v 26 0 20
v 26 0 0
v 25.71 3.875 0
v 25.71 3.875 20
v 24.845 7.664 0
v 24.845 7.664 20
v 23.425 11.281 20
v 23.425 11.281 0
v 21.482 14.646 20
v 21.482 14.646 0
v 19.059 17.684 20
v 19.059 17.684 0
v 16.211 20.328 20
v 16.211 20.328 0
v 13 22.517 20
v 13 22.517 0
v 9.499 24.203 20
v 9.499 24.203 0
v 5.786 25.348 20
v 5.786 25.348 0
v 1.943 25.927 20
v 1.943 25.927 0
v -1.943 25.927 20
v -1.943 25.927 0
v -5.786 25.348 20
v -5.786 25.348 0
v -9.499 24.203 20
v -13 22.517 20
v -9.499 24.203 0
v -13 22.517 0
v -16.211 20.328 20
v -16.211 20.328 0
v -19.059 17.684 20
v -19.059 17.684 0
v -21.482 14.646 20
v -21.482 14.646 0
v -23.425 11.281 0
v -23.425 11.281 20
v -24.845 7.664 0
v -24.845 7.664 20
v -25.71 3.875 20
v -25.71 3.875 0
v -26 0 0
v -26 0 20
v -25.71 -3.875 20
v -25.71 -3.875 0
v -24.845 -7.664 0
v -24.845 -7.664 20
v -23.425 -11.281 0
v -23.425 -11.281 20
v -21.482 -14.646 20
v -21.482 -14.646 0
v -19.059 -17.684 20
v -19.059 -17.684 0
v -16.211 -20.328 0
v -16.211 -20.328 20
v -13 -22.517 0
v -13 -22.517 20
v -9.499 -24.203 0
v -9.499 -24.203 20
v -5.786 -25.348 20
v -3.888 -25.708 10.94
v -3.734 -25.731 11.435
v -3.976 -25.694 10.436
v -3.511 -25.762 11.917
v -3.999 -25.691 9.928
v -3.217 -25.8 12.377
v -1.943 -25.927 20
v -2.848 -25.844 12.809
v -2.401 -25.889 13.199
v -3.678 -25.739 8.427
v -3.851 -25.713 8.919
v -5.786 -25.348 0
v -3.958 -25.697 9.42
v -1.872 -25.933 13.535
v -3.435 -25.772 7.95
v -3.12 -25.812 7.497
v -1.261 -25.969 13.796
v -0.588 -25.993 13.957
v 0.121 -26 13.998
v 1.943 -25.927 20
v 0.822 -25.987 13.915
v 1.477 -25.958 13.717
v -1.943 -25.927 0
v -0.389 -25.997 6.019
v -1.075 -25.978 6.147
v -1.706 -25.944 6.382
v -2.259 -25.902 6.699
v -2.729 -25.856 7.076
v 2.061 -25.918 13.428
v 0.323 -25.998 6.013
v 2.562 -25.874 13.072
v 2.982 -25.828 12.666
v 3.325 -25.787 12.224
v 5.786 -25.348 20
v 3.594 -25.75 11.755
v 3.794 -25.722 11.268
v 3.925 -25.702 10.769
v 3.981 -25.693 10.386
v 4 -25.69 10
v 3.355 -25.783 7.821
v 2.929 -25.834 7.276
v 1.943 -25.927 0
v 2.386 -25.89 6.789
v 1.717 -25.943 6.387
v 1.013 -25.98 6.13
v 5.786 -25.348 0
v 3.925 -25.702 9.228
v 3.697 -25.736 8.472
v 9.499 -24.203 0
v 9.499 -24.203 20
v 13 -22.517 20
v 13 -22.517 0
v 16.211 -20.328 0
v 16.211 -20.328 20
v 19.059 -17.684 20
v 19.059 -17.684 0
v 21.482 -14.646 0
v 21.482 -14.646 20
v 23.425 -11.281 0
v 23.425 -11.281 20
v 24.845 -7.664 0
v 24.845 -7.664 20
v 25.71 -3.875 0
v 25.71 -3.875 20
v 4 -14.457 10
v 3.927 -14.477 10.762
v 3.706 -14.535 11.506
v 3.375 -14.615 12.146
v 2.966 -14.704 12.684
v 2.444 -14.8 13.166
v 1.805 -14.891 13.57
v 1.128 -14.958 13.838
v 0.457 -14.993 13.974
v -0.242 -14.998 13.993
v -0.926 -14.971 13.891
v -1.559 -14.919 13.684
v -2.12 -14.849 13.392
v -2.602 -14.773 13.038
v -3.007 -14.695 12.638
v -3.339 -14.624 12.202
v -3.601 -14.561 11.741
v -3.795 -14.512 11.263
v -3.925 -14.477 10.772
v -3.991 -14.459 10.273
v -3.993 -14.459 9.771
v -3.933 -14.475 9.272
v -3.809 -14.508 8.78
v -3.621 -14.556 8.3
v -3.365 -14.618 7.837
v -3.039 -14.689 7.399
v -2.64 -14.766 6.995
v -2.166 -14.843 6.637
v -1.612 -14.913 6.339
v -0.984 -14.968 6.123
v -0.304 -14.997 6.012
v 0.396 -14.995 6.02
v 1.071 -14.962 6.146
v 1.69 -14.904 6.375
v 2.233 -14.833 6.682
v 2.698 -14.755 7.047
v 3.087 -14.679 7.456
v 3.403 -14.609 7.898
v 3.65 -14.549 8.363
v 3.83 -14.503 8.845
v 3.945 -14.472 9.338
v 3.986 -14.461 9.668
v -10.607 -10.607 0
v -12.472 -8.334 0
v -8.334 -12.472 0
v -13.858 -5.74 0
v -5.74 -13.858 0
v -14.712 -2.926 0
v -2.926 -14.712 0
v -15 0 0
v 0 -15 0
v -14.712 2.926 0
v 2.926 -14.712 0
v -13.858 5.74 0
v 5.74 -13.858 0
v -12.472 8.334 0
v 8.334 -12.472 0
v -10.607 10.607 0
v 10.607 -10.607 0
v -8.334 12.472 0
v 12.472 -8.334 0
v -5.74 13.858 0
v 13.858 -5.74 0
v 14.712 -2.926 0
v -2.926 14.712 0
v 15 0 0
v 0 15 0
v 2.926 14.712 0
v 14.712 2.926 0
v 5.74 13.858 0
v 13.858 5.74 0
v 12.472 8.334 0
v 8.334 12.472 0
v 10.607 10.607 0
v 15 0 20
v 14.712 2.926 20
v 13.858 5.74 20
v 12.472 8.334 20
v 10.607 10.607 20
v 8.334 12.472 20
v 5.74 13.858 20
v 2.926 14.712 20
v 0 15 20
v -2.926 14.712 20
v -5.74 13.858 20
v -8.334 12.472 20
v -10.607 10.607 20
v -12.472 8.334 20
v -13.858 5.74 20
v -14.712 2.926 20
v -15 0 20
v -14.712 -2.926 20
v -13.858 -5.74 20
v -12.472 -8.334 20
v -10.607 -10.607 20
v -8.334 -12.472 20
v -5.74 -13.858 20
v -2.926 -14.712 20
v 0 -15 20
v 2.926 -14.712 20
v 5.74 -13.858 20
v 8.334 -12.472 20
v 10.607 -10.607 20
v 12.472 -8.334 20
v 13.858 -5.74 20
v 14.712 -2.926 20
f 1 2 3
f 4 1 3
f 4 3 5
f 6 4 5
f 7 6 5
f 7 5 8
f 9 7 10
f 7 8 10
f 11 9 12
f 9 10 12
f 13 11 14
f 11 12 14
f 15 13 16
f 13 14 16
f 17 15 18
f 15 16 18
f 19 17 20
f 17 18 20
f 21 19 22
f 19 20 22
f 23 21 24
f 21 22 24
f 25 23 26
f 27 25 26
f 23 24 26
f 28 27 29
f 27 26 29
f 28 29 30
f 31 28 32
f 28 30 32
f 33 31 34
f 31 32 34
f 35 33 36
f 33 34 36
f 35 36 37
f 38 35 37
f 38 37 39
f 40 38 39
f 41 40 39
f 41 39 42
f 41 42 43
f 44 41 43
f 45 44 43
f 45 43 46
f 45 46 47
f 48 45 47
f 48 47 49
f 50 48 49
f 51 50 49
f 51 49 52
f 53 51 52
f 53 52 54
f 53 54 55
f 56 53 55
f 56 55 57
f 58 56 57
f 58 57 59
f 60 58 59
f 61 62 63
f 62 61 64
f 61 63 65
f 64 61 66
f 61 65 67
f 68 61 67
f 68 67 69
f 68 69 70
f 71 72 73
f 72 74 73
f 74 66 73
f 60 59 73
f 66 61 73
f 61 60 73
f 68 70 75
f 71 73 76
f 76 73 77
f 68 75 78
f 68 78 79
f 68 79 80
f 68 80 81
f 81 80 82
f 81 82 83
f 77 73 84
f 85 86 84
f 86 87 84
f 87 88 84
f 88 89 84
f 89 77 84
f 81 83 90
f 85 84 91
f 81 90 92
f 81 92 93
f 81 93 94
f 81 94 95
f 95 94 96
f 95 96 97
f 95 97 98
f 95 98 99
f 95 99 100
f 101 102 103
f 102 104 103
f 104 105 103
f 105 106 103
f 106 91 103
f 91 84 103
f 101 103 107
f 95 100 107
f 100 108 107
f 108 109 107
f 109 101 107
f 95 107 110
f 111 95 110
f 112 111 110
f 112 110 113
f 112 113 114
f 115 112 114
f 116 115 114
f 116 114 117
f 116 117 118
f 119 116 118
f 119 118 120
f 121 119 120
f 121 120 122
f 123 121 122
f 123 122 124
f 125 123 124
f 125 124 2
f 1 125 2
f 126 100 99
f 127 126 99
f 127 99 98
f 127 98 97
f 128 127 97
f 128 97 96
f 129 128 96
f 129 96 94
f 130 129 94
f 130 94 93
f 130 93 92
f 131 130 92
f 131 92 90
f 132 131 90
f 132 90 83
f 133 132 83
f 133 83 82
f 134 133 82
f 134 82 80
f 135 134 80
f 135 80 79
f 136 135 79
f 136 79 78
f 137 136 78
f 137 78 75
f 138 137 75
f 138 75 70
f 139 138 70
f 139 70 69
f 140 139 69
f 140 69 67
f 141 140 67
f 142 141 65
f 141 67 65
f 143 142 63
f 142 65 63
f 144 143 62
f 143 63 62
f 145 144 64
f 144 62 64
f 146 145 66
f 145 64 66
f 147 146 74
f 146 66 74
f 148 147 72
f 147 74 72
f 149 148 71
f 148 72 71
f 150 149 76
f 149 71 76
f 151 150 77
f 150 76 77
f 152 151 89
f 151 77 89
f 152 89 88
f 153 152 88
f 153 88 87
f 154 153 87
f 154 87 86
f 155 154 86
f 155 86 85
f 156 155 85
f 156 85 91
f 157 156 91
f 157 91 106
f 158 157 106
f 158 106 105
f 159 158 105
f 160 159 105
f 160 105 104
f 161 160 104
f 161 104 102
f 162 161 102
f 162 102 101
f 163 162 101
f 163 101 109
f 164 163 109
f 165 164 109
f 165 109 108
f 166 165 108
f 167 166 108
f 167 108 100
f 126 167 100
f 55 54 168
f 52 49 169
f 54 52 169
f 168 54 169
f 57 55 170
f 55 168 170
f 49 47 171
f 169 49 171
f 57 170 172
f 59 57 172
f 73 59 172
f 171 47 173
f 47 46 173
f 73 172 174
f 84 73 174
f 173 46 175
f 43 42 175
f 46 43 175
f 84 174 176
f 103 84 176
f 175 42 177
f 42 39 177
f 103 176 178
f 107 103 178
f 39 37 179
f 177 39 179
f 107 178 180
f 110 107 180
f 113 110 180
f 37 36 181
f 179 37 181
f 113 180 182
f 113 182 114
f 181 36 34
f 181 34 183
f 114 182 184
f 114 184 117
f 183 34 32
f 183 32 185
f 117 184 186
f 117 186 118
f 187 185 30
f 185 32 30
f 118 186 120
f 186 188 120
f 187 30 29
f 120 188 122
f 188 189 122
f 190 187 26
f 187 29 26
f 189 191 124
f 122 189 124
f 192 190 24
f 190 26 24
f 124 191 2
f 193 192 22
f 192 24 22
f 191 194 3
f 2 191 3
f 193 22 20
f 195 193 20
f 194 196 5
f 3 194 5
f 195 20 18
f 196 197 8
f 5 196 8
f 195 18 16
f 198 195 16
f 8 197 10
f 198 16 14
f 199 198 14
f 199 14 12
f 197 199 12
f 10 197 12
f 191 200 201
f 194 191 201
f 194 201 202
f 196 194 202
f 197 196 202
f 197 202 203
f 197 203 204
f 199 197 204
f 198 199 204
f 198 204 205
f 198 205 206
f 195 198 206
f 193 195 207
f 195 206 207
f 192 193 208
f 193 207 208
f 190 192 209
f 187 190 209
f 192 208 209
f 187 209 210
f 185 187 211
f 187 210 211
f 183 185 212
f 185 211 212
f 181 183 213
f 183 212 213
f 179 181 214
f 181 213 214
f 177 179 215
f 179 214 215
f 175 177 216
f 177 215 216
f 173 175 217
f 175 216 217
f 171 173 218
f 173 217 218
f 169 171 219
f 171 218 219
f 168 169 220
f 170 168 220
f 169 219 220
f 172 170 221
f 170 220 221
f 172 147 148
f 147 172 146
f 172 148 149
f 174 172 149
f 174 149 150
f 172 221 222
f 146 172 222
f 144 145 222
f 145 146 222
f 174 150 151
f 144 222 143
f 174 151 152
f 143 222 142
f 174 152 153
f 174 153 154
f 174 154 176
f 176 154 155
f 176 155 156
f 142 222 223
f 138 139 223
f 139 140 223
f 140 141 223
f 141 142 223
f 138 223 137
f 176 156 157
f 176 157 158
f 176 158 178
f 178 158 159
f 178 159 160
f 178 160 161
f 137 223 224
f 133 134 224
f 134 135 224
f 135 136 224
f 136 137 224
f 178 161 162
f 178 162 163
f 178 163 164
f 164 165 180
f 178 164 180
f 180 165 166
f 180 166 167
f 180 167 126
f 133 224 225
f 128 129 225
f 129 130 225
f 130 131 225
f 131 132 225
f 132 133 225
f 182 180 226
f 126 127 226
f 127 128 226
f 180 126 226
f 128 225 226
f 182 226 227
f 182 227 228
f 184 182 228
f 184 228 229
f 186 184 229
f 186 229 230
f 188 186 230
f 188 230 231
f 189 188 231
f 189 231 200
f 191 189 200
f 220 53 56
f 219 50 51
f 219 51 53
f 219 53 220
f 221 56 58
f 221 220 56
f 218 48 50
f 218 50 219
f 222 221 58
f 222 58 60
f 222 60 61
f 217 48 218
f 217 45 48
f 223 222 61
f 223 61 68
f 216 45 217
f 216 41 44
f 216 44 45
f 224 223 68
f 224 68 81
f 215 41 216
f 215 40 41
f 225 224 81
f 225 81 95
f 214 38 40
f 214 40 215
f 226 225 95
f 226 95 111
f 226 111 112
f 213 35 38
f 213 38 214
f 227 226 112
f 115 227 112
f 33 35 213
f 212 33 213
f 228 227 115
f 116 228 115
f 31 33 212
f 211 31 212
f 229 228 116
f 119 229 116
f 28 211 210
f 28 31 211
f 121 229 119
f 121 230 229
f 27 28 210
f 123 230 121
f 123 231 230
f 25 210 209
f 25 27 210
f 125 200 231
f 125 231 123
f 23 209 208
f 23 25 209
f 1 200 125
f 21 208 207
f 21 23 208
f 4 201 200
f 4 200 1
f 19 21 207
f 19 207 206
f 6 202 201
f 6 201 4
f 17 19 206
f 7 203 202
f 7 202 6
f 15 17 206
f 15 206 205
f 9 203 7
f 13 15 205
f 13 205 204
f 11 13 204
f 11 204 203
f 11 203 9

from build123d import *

# Parameters (mm, degrees)
SKETCH001_R     = 26
PAD_DEPTH       = 20
SKETCH002_R     = 15
POCKET_DEPTH    = 20.001
SKETCH_R        = 4
POCKET001_DEPTH = 26


with BuildPart() as part:
    # Sketch001 → Pad (new body)
    with BuildSketch(Plane.XY):
        Circle(SKETCH001_R)
    extrude(amount=PAD_DEPTH)

    # Sketch002 (on Face3 of Pad) → Pocket (cut, through all)
    with BuildSketch(Plane.XY.offset(20)):
        Circle(SKETCH002_R)
    extrude(amount=-POCKET_DEPTH, mode=Mode.SUBTRACT)

    # Sketch (on DatumPlane) → Pocket001 (cut)
    with BuildSketch(Plane.XZ.offset(26)):
        with Locations((0, 10)):
            Circle(SKETCH_R)
    extrude(amount=-POCKET001_DEPTH, mode=Mode.SUBTRACT)


solid = part.part
